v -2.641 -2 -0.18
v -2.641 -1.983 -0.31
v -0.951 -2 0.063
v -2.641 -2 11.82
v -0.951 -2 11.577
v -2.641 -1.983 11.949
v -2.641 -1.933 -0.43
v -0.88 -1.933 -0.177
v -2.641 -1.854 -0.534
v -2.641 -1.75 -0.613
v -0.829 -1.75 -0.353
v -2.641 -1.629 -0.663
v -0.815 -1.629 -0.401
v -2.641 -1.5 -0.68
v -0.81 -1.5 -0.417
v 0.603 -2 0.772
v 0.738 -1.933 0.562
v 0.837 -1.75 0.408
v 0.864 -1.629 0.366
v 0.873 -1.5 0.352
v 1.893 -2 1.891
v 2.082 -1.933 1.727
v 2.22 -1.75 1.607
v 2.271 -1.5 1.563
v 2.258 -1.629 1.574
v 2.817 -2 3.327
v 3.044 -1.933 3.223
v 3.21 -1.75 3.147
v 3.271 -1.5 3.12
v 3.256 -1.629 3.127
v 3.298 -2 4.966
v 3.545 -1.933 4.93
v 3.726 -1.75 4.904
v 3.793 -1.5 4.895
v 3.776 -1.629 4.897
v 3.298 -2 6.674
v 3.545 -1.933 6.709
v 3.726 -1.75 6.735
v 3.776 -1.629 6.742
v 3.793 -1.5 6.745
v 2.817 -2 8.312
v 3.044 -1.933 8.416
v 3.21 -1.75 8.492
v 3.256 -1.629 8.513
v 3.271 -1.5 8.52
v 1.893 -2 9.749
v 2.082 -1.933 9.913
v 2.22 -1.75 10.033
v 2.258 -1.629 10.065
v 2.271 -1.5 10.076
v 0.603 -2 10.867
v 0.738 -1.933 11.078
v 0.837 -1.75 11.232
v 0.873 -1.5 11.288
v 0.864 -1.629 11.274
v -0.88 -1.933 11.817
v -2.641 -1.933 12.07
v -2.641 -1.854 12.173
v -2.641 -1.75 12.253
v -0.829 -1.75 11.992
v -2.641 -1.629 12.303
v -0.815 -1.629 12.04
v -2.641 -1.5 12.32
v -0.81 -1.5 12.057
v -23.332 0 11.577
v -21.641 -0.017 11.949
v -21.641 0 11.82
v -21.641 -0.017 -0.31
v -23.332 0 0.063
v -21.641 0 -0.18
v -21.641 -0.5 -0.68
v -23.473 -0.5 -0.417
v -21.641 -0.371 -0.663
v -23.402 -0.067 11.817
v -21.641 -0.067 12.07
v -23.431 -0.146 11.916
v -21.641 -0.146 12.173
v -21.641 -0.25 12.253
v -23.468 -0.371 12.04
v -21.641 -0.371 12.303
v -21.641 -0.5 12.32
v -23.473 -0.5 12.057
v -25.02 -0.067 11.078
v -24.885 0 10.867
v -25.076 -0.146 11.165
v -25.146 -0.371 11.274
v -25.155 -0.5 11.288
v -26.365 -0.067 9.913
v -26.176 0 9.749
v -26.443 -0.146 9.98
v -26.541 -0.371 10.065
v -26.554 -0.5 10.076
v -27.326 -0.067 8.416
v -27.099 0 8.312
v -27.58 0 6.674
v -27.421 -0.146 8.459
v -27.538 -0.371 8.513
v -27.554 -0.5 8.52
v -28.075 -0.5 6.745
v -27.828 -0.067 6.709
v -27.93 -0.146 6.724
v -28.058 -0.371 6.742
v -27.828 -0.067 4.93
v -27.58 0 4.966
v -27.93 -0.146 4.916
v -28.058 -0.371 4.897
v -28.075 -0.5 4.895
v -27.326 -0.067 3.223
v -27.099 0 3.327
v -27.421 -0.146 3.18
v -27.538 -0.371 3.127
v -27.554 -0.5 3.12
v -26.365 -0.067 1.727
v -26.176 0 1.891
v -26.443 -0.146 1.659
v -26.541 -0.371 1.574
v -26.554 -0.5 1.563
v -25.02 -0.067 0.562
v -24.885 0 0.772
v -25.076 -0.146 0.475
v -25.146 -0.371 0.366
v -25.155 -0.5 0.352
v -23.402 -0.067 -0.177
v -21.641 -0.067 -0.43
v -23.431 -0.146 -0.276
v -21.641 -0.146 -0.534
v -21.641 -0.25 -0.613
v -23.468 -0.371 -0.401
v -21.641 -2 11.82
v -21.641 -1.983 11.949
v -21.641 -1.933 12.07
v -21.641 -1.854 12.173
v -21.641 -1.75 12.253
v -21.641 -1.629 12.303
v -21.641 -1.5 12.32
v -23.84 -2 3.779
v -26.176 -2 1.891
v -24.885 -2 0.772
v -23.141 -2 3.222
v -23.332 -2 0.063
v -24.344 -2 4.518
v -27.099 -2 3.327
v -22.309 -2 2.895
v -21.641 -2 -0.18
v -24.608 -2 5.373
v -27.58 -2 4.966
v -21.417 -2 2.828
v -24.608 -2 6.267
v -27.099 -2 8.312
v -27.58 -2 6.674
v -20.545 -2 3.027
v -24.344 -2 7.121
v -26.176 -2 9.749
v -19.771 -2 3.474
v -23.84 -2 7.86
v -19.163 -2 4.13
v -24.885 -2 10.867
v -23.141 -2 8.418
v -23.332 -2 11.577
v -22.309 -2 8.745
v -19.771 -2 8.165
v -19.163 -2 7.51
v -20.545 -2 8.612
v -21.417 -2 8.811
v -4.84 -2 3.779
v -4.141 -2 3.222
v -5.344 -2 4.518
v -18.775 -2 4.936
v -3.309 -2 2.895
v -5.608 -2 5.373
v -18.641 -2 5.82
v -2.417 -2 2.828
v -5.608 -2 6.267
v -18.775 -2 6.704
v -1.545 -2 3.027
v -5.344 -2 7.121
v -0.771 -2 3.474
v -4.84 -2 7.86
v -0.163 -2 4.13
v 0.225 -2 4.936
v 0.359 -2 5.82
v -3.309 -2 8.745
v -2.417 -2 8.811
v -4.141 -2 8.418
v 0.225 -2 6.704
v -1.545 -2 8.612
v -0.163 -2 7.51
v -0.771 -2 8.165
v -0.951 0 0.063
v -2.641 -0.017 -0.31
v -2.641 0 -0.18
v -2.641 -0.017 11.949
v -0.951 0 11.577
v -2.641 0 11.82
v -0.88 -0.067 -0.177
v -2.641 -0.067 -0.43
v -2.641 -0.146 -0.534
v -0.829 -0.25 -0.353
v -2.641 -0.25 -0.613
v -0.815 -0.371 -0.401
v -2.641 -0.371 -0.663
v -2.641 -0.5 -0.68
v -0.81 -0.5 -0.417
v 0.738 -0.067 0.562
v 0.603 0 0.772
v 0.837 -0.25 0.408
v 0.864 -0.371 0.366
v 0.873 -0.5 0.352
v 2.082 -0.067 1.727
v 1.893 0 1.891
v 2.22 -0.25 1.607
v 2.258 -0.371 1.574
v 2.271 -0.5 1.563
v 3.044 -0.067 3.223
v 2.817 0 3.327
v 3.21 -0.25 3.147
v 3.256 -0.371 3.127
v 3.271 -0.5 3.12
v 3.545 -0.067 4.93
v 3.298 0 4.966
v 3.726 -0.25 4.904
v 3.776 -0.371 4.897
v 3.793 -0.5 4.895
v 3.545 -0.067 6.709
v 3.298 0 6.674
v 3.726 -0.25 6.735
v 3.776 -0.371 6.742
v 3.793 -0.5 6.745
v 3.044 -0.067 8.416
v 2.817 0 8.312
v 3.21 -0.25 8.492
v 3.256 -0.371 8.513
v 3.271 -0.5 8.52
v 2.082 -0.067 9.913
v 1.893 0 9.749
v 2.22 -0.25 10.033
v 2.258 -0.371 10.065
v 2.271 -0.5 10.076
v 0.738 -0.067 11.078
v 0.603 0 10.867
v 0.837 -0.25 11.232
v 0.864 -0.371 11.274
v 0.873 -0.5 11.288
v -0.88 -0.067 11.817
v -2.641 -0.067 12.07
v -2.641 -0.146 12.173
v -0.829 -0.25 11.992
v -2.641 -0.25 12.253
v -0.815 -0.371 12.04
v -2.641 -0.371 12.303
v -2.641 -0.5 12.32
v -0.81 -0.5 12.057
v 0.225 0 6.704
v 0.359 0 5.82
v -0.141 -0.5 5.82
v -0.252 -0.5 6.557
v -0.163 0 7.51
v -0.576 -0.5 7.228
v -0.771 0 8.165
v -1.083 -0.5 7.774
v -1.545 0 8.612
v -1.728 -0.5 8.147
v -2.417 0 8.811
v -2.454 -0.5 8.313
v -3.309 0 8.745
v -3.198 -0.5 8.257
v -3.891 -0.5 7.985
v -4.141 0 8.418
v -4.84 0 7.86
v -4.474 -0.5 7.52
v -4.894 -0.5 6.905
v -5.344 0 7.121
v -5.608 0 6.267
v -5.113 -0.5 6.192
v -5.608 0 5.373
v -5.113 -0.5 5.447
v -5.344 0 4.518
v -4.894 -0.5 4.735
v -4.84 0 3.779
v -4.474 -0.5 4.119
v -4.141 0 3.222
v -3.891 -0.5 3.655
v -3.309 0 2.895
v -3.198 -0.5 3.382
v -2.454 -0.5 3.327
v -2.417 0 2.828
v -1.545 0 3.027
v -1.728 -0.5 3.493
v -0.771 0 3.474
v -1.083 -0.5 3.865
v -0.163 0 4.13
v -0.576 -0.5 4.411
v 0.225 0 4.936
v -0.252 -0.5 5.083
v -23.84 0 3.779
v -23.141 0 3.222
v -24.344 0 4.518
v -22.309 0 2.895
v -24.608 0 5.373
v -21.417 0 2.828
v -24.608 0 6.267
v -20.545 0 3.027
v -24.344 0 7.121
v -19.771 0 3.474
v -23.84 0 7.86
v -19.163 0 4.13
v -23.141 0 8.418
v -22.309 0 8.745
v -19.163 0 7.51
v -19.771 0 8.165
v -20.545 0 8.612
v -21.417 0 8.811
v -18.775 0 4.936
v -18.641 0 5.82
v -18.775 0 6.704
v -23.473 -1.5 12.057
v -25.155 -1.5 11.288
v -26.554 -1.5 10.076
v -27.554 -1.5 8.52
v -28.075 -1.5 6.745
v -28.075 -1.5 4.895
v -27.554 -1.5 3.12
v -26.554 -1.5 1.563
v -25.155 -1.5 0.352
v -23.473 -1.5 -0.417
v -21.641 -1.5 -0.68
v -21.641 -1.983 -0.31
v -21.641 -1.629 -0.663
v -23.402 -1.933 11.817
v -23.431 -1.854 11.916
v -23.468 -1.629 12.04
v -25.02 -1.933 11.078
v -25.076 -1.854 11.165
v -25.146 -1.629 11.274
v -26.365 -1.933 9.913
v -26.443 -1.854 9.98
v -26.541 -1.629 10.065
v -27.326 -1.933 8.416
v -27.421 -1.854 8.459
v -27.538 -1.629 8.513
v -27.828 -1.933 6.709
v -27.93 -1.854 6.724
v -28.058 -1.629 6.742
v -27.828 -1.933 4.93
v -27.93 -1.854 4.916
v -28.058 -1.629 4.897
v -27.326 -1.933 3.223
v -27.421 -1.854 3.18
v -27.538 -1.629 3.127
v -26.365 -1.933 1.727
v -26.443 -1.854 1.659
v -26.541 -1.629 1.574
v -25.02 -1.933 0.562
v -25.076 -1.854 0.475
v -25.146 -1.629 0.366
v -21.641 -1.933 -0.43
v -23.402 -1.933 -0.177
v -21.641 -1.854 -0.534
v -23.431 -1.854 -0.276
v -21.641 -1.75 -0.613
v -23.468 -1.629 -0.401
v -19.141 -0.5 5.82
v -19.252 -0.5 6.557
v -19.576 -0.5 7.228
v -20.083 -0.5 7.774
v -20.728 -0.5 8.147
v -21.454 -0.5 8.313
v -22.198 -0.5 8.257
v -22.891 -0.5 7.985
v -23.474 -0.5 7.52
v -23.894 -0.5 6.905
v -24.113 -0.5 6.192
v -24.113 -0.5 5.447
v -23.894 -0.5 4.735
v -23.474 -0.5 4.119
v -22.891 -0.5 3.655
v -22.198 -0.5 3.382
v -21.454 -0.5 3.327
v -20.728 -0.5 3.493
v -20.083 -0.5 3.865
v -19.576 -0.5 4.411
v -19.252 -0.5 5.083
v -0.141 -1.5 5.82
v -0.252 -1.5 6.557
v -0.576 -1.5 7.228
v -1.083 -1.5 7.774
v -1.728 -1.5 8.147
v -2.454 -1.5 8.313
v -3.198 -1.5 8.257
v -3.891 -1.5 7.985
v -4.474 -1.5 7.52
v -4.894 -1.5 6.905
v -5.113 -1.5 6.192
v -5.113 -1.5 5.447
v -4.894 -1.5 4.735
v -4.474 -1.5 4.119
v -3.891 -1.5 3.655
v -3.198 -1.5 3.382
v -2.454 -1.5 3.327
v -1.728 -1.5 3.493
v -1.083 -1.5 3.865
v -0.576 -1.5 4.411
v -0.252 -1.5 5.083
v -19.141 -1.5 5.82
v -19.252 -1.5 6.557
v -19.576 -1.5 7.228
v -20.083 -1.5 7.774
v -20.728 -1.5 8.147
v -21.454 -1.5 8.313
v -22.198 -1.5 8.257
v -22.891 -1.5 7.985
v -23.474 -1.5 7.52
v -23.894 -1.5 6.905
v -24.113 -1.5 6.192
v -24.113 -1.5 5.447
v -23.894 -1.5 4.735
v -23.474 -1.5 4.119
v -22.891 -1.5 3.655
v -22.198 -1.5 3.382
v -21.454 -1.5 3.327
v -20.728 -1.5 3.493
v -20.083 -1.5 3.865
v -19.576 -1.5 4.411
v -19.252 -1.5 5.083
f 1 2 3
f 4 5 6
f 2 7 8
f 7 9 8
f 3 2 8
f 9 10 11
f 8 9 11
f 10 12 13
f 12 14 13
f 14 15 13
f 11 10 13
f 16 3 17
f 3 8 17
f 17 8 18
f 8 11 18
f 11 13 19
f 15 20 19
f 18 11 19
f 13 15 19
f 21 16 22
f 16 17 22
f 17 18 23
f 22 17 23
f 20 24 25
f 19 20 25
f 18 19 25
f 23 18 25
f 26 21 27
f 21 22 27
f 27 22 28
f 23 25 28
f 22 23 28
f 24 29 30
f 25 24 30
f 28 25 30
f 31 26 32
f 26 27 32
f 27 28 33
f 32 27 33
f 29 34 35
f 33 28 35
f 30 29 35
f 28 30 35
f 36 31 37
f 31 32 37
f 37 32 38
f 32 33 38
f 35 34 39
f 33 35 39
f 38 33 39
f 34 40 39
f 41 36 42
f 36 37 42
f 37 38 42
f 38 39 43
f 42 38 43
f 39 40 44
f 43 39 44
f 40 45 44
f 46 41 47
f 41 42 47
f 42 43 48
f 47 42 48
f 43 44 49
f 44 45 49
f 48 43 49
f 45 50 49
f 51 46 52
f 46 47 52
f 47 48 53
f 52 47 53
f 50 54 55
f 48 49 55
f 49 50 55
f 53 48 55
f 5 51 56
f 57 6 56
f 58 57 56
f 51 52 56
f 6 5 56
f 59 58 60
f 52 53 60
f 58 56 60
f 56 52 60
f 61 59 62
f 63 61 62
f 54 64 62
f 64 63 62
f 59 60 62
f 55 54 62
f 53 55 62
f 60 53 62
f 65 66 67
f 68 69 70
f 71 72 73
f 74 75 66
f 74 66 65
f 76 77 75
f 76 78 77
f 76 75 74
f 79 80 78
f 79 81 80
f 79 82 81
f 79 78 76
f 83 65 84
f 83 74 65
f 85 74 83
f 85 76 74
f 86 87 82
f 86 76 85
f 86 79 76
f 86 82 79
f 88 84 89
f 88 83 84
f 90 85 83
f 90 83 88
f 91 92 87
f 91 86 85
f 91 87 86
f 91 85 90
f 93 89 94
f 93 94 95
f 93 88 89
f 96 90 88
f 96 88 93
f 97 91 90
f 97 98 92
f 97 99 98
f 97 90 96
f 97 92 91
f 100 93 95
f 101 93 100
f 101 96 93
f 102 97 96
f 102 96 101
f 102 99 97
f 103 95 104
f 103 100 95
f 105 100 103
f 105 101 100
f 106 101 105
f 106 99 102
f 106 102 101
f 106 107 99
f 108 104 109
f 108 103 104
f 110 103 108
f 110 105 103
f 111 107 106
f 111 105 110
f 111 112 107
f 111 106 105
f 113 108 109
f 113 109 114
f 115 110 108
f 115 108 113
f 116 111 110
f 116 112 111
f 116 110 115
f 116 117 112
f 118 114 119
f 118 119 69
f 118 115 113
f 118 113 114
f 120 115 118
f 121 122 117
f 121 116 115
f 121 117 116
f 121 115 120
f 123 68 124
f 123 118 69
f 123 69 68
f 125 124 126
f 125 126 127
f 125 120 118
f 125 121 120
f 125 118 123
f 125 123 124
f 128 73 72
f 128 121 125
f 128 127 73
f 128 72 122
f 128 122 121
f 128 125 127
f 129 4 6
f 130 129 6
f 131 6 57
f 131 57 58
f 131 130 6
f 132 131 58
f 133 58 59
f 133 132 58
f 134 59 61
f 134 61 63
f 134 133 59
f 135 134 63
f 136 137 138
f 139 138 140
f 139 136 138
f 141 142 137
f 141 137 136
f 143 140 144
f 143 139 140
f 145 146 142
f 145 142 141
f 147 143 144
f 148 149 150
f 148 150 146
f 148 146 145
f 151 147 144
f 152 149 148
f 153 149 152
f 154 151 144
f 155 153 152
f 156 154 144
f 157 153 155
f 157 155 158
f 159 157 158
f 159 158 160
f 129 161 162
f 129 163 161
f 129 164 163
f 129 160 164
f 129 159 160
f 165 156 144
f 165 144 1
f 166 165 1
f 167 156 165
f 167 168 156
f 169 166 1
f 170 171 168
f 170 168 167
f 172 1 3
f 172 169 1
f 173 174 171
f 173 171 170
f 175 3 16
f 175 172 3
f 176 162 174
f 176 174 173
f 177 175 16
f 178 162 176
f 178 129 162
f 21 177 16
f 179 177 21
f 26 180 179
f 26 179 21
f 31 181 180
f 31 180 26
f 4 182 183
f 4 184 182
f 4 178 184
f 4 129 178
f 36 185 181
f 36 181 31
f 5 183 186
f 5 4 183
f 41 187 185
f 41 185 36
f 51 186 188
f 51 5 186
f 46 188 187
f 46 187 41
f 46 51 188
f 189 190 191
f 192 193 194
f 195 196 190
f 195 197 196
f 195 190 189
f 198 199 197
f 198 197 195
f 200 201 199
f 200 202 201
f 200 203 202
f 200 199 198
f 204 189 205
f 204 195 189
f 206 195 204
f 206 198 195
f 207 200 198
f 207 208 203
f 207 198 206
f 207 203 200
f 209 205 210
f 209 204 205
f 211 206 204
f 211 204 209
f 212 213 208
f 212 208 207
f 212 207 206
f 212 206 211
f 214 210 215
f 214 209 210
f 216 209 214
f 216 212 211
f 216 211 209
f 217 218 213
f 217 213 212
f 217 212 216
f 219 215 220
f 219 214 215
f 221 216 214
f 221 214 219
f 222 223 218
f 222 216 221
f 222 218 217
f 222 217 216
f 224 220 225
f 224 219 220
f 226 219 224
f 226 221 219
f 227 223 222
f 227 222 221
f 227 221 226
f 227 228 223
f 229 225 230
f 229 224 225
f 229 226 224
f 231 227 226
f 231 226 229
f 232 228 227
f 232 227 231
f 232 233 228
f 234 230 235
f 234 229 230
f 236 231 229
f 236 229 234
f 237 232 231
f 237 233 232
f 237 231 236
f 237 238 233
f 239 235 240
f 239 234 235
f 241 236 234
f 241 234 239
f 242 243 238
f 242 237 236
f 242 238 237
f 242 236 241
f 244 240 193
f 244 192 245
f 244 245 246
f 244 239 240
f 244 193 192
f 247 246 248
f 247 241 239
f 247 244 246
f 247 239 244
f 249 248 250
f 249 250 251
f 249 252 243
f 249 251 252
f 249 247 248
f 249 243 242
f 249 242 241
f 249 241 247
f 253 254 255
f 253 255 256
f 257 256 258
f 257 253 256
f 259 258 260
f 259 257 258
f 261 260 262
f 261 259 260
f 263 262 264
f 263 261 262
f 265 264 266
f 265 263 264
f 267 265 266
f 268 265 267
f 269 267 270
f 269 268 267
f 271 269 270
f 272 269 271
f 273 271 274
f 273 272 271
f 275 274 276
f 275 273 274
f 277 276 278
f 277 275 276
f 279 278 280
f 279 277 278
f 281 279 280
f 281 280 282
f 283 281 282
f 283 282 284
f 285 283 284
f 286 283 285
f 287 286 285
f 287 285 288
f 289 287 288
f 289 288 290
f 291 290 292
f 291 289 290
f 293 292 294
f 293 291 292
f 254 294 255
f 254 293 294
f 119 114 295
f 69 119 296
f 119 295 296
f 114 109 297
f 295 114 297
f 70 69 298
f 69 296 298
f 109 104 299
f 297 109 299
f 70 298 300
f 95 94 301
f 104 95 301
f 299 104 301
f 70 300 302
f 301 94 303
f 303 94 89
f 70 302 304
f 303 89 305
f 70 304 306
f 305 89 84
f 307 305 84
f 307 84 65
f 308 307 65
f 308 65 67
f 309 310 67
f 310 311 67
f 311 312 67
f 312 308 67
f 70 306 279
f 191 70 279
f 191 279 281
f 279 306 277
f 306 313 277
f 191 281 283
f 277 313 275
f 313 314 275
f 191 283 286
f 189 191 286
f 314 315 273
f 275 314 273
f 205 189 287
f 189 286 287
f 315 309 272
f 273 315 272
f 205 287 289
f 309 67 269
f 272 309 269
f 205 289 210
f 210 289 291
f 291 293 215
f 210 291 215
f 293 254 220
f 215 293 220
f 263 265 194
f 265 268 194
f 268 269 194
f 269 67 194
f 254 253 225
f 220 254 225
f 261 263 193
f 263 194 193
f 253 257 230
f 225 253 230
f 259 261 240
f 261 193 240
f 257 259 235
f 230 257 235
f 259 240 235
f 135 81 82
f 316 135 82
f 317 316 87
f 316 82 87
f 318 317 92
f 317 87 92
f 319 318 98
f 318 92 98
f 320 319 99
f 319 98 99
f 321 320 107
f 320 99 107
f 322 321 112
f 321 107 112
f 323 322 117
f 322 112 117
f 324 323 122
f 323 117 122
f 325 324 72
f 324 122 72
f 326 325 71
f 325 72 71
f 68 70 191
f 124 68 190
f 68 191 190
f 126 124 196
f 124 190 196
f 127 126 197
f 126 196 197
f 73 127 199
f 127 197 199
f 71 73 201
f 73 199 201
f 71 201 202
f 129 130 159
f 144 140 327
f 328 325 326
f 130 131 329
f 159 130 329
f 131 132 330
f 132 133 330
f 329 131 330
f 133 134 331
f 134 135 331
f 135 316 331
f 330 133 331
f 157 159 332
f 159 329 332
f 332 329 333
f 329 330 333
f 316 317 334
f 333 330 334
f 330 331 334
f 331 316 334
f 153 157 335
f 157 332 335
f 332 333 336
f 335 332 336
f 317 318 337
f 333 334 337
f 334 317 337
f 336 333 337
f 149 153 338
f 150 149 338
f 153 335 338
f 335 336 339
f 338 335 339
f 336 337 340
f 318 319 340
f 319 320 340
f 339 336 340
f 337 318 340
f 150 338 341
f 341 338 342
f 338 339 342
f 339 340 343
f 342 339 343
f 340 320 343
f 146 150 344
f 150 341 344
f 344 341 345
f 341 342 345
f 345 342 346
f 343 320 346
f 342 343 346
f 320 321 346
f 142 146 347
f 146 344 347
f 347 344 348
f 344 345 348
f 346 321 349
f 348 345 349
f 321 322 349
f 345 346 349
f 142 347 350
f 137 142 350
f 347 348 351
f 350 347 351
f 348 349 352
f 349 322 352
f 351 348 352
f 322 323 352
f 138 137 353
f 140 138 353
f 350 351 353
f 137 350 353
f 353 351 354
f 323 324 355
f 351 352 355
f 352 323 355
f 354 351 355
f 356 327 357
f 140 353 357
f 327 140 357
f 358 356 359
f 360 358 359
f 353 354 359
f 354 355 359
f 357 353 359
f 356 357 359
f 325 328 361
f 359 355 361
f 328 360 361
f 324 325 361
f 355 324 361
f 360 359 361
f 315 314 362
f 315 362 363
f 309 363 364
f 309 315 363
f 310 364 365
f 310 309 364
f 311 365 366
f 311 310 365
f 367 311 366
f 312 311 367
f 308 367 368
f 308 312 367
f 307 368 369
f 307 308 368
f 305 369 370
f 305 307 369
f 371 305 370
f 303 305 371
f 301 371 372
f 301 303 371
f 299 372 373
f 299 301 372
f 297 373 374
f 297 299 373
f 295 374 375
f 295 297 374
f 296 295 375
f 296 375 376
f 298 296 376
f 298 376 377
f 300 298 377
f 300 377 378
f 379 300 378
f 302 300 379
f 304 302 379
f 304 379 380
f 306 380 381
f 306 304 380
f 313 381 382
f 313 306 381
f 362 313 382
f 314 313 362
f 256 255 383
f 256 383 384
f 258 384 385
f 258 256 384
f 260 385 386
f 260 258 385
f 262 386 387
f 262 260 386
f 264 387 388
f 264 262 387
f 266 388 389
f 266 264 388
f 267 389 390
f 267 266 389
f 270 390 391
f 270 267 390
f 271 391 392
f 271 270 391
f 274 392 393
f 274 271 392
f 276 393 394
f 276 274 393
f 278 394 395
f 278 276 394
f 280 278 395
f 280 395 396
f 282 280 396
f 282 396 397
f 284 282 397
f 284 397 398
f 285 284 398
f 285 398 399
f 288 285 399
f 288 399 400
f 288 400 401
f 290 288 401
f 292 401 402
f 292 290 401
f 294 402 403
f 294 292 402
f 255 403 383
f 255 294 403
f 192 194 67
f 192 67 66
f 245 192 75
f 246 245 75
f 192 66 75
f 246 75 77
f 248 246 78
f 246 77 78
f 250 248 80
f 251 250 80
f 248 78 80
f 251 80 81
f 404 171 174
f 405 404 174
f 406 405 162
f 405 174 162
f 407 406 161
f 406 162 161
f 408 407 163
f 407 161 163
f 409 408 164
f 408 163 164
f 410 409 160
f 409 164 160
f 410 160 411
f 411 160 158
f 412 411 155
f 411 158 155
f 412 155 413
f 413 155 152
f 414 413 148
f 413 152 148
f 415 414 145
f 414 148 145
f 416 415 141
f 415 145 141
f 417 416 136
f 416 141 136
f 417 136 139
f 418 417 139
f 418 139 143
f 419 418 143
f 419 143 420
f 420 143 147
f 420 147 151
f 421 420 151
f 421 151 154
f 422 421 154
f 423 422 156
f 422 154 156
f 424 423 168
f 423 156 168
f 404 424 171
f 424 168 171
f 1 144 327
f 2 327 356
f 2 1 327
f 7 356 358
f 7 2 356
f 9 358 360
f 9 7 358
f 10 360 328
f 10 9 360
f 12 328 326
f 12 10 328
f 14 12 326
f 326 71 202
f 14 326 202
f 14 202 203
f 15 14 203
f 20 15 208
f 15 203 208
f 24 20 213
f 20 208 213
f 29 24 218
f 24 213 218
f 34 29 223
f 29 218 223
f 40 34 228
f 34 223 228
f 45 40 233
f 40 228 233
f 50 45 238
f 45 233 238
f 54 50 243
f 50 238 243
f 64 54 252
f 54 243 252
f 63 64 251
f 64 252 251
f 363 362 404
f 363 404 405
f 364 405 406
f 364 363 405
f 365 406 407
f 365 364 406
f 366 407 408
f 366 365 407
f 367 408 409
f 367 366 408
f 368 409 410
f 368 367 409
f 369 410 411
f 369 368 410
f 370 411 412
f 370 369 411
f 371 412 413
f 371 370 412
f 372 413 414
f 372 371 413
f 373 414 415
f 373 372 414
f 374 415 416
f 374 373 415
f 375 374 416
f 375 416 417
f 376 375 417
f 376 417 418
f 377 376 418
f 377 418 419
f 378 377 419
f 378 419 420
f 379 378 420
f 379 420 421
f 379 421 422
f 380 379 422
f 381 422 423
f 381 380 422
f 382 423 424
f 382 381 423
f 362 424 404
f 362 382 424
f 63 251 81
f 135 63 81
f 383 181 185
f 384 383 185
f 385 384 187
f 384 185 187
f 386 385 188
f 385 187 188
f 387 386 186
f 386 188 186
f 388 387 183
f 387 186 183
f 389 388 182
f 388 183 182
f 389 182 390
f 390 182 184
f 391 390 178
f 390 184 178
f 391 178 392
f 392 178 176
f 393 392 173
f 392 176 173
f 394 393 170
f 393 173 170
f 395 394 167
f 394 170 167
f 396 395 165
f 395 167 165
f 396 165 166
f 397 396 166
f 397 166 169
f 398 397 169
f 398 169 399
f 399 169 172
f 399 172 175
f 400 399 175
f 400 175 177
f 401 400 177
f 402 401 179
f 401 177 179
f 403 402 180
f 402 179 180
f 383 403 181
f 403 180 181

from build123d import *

# Parameters (mm, degrees)
F0_R     = 2.5
F1_DEPTH = 2
F2_SIZE  = 0.5
F3_R     = 0.5


with BuildPart() as f1:
    # F0 (on Front) → F1 (new body)
    with BuildSketch(Plane.XZ):
        with BuildLine():
            Line((-2.641257, 12.3198), (-21.641257, 12.3198))
            ThreePointArc((-21.641257, 12.3198), (-28.141257, 5.8198), (-21.641257, -0.6802))
            Line((-21.641257, -0.6802), (-2.641257, -0.6802))
            ThreePointArc((-2.641257, -0.6802), (3.858743, 5.8198), (-2.641257, 12.3198))
        make_face()
        with Locations((-21.641257, 5.8198)):
            Circle(F0_R, mode=Mode.SUBTRACT)
        with Locations((-2.641257, 5.8198)):
            Circle(F0_R, mode=Mode.SUBTRACT)
    extrude(amount=F1_DEPTH)

    # F2
    f2_edges = [f1.edges().sort_by_distance(p)[0] for p in [
        (-24.141257, -2, 5.8198),
        (-5.141257, -2, 5.8198),
        (-5.141257, 0, 5.8198),
        (-24.141257, 0, 5.8198),
    ]]
    chamfer(f2_edges, length=F2_SIZE)

    # F3
    f3_edges = [f1.edges().sort_by_distance(p)[0] for p in [
        (-12.141257, 0, 12.3198),
        (-12.141257, -2, 12.3198),
    ]]
    fillet(f3_edges, radius=F3_R)


solid = f1.part
